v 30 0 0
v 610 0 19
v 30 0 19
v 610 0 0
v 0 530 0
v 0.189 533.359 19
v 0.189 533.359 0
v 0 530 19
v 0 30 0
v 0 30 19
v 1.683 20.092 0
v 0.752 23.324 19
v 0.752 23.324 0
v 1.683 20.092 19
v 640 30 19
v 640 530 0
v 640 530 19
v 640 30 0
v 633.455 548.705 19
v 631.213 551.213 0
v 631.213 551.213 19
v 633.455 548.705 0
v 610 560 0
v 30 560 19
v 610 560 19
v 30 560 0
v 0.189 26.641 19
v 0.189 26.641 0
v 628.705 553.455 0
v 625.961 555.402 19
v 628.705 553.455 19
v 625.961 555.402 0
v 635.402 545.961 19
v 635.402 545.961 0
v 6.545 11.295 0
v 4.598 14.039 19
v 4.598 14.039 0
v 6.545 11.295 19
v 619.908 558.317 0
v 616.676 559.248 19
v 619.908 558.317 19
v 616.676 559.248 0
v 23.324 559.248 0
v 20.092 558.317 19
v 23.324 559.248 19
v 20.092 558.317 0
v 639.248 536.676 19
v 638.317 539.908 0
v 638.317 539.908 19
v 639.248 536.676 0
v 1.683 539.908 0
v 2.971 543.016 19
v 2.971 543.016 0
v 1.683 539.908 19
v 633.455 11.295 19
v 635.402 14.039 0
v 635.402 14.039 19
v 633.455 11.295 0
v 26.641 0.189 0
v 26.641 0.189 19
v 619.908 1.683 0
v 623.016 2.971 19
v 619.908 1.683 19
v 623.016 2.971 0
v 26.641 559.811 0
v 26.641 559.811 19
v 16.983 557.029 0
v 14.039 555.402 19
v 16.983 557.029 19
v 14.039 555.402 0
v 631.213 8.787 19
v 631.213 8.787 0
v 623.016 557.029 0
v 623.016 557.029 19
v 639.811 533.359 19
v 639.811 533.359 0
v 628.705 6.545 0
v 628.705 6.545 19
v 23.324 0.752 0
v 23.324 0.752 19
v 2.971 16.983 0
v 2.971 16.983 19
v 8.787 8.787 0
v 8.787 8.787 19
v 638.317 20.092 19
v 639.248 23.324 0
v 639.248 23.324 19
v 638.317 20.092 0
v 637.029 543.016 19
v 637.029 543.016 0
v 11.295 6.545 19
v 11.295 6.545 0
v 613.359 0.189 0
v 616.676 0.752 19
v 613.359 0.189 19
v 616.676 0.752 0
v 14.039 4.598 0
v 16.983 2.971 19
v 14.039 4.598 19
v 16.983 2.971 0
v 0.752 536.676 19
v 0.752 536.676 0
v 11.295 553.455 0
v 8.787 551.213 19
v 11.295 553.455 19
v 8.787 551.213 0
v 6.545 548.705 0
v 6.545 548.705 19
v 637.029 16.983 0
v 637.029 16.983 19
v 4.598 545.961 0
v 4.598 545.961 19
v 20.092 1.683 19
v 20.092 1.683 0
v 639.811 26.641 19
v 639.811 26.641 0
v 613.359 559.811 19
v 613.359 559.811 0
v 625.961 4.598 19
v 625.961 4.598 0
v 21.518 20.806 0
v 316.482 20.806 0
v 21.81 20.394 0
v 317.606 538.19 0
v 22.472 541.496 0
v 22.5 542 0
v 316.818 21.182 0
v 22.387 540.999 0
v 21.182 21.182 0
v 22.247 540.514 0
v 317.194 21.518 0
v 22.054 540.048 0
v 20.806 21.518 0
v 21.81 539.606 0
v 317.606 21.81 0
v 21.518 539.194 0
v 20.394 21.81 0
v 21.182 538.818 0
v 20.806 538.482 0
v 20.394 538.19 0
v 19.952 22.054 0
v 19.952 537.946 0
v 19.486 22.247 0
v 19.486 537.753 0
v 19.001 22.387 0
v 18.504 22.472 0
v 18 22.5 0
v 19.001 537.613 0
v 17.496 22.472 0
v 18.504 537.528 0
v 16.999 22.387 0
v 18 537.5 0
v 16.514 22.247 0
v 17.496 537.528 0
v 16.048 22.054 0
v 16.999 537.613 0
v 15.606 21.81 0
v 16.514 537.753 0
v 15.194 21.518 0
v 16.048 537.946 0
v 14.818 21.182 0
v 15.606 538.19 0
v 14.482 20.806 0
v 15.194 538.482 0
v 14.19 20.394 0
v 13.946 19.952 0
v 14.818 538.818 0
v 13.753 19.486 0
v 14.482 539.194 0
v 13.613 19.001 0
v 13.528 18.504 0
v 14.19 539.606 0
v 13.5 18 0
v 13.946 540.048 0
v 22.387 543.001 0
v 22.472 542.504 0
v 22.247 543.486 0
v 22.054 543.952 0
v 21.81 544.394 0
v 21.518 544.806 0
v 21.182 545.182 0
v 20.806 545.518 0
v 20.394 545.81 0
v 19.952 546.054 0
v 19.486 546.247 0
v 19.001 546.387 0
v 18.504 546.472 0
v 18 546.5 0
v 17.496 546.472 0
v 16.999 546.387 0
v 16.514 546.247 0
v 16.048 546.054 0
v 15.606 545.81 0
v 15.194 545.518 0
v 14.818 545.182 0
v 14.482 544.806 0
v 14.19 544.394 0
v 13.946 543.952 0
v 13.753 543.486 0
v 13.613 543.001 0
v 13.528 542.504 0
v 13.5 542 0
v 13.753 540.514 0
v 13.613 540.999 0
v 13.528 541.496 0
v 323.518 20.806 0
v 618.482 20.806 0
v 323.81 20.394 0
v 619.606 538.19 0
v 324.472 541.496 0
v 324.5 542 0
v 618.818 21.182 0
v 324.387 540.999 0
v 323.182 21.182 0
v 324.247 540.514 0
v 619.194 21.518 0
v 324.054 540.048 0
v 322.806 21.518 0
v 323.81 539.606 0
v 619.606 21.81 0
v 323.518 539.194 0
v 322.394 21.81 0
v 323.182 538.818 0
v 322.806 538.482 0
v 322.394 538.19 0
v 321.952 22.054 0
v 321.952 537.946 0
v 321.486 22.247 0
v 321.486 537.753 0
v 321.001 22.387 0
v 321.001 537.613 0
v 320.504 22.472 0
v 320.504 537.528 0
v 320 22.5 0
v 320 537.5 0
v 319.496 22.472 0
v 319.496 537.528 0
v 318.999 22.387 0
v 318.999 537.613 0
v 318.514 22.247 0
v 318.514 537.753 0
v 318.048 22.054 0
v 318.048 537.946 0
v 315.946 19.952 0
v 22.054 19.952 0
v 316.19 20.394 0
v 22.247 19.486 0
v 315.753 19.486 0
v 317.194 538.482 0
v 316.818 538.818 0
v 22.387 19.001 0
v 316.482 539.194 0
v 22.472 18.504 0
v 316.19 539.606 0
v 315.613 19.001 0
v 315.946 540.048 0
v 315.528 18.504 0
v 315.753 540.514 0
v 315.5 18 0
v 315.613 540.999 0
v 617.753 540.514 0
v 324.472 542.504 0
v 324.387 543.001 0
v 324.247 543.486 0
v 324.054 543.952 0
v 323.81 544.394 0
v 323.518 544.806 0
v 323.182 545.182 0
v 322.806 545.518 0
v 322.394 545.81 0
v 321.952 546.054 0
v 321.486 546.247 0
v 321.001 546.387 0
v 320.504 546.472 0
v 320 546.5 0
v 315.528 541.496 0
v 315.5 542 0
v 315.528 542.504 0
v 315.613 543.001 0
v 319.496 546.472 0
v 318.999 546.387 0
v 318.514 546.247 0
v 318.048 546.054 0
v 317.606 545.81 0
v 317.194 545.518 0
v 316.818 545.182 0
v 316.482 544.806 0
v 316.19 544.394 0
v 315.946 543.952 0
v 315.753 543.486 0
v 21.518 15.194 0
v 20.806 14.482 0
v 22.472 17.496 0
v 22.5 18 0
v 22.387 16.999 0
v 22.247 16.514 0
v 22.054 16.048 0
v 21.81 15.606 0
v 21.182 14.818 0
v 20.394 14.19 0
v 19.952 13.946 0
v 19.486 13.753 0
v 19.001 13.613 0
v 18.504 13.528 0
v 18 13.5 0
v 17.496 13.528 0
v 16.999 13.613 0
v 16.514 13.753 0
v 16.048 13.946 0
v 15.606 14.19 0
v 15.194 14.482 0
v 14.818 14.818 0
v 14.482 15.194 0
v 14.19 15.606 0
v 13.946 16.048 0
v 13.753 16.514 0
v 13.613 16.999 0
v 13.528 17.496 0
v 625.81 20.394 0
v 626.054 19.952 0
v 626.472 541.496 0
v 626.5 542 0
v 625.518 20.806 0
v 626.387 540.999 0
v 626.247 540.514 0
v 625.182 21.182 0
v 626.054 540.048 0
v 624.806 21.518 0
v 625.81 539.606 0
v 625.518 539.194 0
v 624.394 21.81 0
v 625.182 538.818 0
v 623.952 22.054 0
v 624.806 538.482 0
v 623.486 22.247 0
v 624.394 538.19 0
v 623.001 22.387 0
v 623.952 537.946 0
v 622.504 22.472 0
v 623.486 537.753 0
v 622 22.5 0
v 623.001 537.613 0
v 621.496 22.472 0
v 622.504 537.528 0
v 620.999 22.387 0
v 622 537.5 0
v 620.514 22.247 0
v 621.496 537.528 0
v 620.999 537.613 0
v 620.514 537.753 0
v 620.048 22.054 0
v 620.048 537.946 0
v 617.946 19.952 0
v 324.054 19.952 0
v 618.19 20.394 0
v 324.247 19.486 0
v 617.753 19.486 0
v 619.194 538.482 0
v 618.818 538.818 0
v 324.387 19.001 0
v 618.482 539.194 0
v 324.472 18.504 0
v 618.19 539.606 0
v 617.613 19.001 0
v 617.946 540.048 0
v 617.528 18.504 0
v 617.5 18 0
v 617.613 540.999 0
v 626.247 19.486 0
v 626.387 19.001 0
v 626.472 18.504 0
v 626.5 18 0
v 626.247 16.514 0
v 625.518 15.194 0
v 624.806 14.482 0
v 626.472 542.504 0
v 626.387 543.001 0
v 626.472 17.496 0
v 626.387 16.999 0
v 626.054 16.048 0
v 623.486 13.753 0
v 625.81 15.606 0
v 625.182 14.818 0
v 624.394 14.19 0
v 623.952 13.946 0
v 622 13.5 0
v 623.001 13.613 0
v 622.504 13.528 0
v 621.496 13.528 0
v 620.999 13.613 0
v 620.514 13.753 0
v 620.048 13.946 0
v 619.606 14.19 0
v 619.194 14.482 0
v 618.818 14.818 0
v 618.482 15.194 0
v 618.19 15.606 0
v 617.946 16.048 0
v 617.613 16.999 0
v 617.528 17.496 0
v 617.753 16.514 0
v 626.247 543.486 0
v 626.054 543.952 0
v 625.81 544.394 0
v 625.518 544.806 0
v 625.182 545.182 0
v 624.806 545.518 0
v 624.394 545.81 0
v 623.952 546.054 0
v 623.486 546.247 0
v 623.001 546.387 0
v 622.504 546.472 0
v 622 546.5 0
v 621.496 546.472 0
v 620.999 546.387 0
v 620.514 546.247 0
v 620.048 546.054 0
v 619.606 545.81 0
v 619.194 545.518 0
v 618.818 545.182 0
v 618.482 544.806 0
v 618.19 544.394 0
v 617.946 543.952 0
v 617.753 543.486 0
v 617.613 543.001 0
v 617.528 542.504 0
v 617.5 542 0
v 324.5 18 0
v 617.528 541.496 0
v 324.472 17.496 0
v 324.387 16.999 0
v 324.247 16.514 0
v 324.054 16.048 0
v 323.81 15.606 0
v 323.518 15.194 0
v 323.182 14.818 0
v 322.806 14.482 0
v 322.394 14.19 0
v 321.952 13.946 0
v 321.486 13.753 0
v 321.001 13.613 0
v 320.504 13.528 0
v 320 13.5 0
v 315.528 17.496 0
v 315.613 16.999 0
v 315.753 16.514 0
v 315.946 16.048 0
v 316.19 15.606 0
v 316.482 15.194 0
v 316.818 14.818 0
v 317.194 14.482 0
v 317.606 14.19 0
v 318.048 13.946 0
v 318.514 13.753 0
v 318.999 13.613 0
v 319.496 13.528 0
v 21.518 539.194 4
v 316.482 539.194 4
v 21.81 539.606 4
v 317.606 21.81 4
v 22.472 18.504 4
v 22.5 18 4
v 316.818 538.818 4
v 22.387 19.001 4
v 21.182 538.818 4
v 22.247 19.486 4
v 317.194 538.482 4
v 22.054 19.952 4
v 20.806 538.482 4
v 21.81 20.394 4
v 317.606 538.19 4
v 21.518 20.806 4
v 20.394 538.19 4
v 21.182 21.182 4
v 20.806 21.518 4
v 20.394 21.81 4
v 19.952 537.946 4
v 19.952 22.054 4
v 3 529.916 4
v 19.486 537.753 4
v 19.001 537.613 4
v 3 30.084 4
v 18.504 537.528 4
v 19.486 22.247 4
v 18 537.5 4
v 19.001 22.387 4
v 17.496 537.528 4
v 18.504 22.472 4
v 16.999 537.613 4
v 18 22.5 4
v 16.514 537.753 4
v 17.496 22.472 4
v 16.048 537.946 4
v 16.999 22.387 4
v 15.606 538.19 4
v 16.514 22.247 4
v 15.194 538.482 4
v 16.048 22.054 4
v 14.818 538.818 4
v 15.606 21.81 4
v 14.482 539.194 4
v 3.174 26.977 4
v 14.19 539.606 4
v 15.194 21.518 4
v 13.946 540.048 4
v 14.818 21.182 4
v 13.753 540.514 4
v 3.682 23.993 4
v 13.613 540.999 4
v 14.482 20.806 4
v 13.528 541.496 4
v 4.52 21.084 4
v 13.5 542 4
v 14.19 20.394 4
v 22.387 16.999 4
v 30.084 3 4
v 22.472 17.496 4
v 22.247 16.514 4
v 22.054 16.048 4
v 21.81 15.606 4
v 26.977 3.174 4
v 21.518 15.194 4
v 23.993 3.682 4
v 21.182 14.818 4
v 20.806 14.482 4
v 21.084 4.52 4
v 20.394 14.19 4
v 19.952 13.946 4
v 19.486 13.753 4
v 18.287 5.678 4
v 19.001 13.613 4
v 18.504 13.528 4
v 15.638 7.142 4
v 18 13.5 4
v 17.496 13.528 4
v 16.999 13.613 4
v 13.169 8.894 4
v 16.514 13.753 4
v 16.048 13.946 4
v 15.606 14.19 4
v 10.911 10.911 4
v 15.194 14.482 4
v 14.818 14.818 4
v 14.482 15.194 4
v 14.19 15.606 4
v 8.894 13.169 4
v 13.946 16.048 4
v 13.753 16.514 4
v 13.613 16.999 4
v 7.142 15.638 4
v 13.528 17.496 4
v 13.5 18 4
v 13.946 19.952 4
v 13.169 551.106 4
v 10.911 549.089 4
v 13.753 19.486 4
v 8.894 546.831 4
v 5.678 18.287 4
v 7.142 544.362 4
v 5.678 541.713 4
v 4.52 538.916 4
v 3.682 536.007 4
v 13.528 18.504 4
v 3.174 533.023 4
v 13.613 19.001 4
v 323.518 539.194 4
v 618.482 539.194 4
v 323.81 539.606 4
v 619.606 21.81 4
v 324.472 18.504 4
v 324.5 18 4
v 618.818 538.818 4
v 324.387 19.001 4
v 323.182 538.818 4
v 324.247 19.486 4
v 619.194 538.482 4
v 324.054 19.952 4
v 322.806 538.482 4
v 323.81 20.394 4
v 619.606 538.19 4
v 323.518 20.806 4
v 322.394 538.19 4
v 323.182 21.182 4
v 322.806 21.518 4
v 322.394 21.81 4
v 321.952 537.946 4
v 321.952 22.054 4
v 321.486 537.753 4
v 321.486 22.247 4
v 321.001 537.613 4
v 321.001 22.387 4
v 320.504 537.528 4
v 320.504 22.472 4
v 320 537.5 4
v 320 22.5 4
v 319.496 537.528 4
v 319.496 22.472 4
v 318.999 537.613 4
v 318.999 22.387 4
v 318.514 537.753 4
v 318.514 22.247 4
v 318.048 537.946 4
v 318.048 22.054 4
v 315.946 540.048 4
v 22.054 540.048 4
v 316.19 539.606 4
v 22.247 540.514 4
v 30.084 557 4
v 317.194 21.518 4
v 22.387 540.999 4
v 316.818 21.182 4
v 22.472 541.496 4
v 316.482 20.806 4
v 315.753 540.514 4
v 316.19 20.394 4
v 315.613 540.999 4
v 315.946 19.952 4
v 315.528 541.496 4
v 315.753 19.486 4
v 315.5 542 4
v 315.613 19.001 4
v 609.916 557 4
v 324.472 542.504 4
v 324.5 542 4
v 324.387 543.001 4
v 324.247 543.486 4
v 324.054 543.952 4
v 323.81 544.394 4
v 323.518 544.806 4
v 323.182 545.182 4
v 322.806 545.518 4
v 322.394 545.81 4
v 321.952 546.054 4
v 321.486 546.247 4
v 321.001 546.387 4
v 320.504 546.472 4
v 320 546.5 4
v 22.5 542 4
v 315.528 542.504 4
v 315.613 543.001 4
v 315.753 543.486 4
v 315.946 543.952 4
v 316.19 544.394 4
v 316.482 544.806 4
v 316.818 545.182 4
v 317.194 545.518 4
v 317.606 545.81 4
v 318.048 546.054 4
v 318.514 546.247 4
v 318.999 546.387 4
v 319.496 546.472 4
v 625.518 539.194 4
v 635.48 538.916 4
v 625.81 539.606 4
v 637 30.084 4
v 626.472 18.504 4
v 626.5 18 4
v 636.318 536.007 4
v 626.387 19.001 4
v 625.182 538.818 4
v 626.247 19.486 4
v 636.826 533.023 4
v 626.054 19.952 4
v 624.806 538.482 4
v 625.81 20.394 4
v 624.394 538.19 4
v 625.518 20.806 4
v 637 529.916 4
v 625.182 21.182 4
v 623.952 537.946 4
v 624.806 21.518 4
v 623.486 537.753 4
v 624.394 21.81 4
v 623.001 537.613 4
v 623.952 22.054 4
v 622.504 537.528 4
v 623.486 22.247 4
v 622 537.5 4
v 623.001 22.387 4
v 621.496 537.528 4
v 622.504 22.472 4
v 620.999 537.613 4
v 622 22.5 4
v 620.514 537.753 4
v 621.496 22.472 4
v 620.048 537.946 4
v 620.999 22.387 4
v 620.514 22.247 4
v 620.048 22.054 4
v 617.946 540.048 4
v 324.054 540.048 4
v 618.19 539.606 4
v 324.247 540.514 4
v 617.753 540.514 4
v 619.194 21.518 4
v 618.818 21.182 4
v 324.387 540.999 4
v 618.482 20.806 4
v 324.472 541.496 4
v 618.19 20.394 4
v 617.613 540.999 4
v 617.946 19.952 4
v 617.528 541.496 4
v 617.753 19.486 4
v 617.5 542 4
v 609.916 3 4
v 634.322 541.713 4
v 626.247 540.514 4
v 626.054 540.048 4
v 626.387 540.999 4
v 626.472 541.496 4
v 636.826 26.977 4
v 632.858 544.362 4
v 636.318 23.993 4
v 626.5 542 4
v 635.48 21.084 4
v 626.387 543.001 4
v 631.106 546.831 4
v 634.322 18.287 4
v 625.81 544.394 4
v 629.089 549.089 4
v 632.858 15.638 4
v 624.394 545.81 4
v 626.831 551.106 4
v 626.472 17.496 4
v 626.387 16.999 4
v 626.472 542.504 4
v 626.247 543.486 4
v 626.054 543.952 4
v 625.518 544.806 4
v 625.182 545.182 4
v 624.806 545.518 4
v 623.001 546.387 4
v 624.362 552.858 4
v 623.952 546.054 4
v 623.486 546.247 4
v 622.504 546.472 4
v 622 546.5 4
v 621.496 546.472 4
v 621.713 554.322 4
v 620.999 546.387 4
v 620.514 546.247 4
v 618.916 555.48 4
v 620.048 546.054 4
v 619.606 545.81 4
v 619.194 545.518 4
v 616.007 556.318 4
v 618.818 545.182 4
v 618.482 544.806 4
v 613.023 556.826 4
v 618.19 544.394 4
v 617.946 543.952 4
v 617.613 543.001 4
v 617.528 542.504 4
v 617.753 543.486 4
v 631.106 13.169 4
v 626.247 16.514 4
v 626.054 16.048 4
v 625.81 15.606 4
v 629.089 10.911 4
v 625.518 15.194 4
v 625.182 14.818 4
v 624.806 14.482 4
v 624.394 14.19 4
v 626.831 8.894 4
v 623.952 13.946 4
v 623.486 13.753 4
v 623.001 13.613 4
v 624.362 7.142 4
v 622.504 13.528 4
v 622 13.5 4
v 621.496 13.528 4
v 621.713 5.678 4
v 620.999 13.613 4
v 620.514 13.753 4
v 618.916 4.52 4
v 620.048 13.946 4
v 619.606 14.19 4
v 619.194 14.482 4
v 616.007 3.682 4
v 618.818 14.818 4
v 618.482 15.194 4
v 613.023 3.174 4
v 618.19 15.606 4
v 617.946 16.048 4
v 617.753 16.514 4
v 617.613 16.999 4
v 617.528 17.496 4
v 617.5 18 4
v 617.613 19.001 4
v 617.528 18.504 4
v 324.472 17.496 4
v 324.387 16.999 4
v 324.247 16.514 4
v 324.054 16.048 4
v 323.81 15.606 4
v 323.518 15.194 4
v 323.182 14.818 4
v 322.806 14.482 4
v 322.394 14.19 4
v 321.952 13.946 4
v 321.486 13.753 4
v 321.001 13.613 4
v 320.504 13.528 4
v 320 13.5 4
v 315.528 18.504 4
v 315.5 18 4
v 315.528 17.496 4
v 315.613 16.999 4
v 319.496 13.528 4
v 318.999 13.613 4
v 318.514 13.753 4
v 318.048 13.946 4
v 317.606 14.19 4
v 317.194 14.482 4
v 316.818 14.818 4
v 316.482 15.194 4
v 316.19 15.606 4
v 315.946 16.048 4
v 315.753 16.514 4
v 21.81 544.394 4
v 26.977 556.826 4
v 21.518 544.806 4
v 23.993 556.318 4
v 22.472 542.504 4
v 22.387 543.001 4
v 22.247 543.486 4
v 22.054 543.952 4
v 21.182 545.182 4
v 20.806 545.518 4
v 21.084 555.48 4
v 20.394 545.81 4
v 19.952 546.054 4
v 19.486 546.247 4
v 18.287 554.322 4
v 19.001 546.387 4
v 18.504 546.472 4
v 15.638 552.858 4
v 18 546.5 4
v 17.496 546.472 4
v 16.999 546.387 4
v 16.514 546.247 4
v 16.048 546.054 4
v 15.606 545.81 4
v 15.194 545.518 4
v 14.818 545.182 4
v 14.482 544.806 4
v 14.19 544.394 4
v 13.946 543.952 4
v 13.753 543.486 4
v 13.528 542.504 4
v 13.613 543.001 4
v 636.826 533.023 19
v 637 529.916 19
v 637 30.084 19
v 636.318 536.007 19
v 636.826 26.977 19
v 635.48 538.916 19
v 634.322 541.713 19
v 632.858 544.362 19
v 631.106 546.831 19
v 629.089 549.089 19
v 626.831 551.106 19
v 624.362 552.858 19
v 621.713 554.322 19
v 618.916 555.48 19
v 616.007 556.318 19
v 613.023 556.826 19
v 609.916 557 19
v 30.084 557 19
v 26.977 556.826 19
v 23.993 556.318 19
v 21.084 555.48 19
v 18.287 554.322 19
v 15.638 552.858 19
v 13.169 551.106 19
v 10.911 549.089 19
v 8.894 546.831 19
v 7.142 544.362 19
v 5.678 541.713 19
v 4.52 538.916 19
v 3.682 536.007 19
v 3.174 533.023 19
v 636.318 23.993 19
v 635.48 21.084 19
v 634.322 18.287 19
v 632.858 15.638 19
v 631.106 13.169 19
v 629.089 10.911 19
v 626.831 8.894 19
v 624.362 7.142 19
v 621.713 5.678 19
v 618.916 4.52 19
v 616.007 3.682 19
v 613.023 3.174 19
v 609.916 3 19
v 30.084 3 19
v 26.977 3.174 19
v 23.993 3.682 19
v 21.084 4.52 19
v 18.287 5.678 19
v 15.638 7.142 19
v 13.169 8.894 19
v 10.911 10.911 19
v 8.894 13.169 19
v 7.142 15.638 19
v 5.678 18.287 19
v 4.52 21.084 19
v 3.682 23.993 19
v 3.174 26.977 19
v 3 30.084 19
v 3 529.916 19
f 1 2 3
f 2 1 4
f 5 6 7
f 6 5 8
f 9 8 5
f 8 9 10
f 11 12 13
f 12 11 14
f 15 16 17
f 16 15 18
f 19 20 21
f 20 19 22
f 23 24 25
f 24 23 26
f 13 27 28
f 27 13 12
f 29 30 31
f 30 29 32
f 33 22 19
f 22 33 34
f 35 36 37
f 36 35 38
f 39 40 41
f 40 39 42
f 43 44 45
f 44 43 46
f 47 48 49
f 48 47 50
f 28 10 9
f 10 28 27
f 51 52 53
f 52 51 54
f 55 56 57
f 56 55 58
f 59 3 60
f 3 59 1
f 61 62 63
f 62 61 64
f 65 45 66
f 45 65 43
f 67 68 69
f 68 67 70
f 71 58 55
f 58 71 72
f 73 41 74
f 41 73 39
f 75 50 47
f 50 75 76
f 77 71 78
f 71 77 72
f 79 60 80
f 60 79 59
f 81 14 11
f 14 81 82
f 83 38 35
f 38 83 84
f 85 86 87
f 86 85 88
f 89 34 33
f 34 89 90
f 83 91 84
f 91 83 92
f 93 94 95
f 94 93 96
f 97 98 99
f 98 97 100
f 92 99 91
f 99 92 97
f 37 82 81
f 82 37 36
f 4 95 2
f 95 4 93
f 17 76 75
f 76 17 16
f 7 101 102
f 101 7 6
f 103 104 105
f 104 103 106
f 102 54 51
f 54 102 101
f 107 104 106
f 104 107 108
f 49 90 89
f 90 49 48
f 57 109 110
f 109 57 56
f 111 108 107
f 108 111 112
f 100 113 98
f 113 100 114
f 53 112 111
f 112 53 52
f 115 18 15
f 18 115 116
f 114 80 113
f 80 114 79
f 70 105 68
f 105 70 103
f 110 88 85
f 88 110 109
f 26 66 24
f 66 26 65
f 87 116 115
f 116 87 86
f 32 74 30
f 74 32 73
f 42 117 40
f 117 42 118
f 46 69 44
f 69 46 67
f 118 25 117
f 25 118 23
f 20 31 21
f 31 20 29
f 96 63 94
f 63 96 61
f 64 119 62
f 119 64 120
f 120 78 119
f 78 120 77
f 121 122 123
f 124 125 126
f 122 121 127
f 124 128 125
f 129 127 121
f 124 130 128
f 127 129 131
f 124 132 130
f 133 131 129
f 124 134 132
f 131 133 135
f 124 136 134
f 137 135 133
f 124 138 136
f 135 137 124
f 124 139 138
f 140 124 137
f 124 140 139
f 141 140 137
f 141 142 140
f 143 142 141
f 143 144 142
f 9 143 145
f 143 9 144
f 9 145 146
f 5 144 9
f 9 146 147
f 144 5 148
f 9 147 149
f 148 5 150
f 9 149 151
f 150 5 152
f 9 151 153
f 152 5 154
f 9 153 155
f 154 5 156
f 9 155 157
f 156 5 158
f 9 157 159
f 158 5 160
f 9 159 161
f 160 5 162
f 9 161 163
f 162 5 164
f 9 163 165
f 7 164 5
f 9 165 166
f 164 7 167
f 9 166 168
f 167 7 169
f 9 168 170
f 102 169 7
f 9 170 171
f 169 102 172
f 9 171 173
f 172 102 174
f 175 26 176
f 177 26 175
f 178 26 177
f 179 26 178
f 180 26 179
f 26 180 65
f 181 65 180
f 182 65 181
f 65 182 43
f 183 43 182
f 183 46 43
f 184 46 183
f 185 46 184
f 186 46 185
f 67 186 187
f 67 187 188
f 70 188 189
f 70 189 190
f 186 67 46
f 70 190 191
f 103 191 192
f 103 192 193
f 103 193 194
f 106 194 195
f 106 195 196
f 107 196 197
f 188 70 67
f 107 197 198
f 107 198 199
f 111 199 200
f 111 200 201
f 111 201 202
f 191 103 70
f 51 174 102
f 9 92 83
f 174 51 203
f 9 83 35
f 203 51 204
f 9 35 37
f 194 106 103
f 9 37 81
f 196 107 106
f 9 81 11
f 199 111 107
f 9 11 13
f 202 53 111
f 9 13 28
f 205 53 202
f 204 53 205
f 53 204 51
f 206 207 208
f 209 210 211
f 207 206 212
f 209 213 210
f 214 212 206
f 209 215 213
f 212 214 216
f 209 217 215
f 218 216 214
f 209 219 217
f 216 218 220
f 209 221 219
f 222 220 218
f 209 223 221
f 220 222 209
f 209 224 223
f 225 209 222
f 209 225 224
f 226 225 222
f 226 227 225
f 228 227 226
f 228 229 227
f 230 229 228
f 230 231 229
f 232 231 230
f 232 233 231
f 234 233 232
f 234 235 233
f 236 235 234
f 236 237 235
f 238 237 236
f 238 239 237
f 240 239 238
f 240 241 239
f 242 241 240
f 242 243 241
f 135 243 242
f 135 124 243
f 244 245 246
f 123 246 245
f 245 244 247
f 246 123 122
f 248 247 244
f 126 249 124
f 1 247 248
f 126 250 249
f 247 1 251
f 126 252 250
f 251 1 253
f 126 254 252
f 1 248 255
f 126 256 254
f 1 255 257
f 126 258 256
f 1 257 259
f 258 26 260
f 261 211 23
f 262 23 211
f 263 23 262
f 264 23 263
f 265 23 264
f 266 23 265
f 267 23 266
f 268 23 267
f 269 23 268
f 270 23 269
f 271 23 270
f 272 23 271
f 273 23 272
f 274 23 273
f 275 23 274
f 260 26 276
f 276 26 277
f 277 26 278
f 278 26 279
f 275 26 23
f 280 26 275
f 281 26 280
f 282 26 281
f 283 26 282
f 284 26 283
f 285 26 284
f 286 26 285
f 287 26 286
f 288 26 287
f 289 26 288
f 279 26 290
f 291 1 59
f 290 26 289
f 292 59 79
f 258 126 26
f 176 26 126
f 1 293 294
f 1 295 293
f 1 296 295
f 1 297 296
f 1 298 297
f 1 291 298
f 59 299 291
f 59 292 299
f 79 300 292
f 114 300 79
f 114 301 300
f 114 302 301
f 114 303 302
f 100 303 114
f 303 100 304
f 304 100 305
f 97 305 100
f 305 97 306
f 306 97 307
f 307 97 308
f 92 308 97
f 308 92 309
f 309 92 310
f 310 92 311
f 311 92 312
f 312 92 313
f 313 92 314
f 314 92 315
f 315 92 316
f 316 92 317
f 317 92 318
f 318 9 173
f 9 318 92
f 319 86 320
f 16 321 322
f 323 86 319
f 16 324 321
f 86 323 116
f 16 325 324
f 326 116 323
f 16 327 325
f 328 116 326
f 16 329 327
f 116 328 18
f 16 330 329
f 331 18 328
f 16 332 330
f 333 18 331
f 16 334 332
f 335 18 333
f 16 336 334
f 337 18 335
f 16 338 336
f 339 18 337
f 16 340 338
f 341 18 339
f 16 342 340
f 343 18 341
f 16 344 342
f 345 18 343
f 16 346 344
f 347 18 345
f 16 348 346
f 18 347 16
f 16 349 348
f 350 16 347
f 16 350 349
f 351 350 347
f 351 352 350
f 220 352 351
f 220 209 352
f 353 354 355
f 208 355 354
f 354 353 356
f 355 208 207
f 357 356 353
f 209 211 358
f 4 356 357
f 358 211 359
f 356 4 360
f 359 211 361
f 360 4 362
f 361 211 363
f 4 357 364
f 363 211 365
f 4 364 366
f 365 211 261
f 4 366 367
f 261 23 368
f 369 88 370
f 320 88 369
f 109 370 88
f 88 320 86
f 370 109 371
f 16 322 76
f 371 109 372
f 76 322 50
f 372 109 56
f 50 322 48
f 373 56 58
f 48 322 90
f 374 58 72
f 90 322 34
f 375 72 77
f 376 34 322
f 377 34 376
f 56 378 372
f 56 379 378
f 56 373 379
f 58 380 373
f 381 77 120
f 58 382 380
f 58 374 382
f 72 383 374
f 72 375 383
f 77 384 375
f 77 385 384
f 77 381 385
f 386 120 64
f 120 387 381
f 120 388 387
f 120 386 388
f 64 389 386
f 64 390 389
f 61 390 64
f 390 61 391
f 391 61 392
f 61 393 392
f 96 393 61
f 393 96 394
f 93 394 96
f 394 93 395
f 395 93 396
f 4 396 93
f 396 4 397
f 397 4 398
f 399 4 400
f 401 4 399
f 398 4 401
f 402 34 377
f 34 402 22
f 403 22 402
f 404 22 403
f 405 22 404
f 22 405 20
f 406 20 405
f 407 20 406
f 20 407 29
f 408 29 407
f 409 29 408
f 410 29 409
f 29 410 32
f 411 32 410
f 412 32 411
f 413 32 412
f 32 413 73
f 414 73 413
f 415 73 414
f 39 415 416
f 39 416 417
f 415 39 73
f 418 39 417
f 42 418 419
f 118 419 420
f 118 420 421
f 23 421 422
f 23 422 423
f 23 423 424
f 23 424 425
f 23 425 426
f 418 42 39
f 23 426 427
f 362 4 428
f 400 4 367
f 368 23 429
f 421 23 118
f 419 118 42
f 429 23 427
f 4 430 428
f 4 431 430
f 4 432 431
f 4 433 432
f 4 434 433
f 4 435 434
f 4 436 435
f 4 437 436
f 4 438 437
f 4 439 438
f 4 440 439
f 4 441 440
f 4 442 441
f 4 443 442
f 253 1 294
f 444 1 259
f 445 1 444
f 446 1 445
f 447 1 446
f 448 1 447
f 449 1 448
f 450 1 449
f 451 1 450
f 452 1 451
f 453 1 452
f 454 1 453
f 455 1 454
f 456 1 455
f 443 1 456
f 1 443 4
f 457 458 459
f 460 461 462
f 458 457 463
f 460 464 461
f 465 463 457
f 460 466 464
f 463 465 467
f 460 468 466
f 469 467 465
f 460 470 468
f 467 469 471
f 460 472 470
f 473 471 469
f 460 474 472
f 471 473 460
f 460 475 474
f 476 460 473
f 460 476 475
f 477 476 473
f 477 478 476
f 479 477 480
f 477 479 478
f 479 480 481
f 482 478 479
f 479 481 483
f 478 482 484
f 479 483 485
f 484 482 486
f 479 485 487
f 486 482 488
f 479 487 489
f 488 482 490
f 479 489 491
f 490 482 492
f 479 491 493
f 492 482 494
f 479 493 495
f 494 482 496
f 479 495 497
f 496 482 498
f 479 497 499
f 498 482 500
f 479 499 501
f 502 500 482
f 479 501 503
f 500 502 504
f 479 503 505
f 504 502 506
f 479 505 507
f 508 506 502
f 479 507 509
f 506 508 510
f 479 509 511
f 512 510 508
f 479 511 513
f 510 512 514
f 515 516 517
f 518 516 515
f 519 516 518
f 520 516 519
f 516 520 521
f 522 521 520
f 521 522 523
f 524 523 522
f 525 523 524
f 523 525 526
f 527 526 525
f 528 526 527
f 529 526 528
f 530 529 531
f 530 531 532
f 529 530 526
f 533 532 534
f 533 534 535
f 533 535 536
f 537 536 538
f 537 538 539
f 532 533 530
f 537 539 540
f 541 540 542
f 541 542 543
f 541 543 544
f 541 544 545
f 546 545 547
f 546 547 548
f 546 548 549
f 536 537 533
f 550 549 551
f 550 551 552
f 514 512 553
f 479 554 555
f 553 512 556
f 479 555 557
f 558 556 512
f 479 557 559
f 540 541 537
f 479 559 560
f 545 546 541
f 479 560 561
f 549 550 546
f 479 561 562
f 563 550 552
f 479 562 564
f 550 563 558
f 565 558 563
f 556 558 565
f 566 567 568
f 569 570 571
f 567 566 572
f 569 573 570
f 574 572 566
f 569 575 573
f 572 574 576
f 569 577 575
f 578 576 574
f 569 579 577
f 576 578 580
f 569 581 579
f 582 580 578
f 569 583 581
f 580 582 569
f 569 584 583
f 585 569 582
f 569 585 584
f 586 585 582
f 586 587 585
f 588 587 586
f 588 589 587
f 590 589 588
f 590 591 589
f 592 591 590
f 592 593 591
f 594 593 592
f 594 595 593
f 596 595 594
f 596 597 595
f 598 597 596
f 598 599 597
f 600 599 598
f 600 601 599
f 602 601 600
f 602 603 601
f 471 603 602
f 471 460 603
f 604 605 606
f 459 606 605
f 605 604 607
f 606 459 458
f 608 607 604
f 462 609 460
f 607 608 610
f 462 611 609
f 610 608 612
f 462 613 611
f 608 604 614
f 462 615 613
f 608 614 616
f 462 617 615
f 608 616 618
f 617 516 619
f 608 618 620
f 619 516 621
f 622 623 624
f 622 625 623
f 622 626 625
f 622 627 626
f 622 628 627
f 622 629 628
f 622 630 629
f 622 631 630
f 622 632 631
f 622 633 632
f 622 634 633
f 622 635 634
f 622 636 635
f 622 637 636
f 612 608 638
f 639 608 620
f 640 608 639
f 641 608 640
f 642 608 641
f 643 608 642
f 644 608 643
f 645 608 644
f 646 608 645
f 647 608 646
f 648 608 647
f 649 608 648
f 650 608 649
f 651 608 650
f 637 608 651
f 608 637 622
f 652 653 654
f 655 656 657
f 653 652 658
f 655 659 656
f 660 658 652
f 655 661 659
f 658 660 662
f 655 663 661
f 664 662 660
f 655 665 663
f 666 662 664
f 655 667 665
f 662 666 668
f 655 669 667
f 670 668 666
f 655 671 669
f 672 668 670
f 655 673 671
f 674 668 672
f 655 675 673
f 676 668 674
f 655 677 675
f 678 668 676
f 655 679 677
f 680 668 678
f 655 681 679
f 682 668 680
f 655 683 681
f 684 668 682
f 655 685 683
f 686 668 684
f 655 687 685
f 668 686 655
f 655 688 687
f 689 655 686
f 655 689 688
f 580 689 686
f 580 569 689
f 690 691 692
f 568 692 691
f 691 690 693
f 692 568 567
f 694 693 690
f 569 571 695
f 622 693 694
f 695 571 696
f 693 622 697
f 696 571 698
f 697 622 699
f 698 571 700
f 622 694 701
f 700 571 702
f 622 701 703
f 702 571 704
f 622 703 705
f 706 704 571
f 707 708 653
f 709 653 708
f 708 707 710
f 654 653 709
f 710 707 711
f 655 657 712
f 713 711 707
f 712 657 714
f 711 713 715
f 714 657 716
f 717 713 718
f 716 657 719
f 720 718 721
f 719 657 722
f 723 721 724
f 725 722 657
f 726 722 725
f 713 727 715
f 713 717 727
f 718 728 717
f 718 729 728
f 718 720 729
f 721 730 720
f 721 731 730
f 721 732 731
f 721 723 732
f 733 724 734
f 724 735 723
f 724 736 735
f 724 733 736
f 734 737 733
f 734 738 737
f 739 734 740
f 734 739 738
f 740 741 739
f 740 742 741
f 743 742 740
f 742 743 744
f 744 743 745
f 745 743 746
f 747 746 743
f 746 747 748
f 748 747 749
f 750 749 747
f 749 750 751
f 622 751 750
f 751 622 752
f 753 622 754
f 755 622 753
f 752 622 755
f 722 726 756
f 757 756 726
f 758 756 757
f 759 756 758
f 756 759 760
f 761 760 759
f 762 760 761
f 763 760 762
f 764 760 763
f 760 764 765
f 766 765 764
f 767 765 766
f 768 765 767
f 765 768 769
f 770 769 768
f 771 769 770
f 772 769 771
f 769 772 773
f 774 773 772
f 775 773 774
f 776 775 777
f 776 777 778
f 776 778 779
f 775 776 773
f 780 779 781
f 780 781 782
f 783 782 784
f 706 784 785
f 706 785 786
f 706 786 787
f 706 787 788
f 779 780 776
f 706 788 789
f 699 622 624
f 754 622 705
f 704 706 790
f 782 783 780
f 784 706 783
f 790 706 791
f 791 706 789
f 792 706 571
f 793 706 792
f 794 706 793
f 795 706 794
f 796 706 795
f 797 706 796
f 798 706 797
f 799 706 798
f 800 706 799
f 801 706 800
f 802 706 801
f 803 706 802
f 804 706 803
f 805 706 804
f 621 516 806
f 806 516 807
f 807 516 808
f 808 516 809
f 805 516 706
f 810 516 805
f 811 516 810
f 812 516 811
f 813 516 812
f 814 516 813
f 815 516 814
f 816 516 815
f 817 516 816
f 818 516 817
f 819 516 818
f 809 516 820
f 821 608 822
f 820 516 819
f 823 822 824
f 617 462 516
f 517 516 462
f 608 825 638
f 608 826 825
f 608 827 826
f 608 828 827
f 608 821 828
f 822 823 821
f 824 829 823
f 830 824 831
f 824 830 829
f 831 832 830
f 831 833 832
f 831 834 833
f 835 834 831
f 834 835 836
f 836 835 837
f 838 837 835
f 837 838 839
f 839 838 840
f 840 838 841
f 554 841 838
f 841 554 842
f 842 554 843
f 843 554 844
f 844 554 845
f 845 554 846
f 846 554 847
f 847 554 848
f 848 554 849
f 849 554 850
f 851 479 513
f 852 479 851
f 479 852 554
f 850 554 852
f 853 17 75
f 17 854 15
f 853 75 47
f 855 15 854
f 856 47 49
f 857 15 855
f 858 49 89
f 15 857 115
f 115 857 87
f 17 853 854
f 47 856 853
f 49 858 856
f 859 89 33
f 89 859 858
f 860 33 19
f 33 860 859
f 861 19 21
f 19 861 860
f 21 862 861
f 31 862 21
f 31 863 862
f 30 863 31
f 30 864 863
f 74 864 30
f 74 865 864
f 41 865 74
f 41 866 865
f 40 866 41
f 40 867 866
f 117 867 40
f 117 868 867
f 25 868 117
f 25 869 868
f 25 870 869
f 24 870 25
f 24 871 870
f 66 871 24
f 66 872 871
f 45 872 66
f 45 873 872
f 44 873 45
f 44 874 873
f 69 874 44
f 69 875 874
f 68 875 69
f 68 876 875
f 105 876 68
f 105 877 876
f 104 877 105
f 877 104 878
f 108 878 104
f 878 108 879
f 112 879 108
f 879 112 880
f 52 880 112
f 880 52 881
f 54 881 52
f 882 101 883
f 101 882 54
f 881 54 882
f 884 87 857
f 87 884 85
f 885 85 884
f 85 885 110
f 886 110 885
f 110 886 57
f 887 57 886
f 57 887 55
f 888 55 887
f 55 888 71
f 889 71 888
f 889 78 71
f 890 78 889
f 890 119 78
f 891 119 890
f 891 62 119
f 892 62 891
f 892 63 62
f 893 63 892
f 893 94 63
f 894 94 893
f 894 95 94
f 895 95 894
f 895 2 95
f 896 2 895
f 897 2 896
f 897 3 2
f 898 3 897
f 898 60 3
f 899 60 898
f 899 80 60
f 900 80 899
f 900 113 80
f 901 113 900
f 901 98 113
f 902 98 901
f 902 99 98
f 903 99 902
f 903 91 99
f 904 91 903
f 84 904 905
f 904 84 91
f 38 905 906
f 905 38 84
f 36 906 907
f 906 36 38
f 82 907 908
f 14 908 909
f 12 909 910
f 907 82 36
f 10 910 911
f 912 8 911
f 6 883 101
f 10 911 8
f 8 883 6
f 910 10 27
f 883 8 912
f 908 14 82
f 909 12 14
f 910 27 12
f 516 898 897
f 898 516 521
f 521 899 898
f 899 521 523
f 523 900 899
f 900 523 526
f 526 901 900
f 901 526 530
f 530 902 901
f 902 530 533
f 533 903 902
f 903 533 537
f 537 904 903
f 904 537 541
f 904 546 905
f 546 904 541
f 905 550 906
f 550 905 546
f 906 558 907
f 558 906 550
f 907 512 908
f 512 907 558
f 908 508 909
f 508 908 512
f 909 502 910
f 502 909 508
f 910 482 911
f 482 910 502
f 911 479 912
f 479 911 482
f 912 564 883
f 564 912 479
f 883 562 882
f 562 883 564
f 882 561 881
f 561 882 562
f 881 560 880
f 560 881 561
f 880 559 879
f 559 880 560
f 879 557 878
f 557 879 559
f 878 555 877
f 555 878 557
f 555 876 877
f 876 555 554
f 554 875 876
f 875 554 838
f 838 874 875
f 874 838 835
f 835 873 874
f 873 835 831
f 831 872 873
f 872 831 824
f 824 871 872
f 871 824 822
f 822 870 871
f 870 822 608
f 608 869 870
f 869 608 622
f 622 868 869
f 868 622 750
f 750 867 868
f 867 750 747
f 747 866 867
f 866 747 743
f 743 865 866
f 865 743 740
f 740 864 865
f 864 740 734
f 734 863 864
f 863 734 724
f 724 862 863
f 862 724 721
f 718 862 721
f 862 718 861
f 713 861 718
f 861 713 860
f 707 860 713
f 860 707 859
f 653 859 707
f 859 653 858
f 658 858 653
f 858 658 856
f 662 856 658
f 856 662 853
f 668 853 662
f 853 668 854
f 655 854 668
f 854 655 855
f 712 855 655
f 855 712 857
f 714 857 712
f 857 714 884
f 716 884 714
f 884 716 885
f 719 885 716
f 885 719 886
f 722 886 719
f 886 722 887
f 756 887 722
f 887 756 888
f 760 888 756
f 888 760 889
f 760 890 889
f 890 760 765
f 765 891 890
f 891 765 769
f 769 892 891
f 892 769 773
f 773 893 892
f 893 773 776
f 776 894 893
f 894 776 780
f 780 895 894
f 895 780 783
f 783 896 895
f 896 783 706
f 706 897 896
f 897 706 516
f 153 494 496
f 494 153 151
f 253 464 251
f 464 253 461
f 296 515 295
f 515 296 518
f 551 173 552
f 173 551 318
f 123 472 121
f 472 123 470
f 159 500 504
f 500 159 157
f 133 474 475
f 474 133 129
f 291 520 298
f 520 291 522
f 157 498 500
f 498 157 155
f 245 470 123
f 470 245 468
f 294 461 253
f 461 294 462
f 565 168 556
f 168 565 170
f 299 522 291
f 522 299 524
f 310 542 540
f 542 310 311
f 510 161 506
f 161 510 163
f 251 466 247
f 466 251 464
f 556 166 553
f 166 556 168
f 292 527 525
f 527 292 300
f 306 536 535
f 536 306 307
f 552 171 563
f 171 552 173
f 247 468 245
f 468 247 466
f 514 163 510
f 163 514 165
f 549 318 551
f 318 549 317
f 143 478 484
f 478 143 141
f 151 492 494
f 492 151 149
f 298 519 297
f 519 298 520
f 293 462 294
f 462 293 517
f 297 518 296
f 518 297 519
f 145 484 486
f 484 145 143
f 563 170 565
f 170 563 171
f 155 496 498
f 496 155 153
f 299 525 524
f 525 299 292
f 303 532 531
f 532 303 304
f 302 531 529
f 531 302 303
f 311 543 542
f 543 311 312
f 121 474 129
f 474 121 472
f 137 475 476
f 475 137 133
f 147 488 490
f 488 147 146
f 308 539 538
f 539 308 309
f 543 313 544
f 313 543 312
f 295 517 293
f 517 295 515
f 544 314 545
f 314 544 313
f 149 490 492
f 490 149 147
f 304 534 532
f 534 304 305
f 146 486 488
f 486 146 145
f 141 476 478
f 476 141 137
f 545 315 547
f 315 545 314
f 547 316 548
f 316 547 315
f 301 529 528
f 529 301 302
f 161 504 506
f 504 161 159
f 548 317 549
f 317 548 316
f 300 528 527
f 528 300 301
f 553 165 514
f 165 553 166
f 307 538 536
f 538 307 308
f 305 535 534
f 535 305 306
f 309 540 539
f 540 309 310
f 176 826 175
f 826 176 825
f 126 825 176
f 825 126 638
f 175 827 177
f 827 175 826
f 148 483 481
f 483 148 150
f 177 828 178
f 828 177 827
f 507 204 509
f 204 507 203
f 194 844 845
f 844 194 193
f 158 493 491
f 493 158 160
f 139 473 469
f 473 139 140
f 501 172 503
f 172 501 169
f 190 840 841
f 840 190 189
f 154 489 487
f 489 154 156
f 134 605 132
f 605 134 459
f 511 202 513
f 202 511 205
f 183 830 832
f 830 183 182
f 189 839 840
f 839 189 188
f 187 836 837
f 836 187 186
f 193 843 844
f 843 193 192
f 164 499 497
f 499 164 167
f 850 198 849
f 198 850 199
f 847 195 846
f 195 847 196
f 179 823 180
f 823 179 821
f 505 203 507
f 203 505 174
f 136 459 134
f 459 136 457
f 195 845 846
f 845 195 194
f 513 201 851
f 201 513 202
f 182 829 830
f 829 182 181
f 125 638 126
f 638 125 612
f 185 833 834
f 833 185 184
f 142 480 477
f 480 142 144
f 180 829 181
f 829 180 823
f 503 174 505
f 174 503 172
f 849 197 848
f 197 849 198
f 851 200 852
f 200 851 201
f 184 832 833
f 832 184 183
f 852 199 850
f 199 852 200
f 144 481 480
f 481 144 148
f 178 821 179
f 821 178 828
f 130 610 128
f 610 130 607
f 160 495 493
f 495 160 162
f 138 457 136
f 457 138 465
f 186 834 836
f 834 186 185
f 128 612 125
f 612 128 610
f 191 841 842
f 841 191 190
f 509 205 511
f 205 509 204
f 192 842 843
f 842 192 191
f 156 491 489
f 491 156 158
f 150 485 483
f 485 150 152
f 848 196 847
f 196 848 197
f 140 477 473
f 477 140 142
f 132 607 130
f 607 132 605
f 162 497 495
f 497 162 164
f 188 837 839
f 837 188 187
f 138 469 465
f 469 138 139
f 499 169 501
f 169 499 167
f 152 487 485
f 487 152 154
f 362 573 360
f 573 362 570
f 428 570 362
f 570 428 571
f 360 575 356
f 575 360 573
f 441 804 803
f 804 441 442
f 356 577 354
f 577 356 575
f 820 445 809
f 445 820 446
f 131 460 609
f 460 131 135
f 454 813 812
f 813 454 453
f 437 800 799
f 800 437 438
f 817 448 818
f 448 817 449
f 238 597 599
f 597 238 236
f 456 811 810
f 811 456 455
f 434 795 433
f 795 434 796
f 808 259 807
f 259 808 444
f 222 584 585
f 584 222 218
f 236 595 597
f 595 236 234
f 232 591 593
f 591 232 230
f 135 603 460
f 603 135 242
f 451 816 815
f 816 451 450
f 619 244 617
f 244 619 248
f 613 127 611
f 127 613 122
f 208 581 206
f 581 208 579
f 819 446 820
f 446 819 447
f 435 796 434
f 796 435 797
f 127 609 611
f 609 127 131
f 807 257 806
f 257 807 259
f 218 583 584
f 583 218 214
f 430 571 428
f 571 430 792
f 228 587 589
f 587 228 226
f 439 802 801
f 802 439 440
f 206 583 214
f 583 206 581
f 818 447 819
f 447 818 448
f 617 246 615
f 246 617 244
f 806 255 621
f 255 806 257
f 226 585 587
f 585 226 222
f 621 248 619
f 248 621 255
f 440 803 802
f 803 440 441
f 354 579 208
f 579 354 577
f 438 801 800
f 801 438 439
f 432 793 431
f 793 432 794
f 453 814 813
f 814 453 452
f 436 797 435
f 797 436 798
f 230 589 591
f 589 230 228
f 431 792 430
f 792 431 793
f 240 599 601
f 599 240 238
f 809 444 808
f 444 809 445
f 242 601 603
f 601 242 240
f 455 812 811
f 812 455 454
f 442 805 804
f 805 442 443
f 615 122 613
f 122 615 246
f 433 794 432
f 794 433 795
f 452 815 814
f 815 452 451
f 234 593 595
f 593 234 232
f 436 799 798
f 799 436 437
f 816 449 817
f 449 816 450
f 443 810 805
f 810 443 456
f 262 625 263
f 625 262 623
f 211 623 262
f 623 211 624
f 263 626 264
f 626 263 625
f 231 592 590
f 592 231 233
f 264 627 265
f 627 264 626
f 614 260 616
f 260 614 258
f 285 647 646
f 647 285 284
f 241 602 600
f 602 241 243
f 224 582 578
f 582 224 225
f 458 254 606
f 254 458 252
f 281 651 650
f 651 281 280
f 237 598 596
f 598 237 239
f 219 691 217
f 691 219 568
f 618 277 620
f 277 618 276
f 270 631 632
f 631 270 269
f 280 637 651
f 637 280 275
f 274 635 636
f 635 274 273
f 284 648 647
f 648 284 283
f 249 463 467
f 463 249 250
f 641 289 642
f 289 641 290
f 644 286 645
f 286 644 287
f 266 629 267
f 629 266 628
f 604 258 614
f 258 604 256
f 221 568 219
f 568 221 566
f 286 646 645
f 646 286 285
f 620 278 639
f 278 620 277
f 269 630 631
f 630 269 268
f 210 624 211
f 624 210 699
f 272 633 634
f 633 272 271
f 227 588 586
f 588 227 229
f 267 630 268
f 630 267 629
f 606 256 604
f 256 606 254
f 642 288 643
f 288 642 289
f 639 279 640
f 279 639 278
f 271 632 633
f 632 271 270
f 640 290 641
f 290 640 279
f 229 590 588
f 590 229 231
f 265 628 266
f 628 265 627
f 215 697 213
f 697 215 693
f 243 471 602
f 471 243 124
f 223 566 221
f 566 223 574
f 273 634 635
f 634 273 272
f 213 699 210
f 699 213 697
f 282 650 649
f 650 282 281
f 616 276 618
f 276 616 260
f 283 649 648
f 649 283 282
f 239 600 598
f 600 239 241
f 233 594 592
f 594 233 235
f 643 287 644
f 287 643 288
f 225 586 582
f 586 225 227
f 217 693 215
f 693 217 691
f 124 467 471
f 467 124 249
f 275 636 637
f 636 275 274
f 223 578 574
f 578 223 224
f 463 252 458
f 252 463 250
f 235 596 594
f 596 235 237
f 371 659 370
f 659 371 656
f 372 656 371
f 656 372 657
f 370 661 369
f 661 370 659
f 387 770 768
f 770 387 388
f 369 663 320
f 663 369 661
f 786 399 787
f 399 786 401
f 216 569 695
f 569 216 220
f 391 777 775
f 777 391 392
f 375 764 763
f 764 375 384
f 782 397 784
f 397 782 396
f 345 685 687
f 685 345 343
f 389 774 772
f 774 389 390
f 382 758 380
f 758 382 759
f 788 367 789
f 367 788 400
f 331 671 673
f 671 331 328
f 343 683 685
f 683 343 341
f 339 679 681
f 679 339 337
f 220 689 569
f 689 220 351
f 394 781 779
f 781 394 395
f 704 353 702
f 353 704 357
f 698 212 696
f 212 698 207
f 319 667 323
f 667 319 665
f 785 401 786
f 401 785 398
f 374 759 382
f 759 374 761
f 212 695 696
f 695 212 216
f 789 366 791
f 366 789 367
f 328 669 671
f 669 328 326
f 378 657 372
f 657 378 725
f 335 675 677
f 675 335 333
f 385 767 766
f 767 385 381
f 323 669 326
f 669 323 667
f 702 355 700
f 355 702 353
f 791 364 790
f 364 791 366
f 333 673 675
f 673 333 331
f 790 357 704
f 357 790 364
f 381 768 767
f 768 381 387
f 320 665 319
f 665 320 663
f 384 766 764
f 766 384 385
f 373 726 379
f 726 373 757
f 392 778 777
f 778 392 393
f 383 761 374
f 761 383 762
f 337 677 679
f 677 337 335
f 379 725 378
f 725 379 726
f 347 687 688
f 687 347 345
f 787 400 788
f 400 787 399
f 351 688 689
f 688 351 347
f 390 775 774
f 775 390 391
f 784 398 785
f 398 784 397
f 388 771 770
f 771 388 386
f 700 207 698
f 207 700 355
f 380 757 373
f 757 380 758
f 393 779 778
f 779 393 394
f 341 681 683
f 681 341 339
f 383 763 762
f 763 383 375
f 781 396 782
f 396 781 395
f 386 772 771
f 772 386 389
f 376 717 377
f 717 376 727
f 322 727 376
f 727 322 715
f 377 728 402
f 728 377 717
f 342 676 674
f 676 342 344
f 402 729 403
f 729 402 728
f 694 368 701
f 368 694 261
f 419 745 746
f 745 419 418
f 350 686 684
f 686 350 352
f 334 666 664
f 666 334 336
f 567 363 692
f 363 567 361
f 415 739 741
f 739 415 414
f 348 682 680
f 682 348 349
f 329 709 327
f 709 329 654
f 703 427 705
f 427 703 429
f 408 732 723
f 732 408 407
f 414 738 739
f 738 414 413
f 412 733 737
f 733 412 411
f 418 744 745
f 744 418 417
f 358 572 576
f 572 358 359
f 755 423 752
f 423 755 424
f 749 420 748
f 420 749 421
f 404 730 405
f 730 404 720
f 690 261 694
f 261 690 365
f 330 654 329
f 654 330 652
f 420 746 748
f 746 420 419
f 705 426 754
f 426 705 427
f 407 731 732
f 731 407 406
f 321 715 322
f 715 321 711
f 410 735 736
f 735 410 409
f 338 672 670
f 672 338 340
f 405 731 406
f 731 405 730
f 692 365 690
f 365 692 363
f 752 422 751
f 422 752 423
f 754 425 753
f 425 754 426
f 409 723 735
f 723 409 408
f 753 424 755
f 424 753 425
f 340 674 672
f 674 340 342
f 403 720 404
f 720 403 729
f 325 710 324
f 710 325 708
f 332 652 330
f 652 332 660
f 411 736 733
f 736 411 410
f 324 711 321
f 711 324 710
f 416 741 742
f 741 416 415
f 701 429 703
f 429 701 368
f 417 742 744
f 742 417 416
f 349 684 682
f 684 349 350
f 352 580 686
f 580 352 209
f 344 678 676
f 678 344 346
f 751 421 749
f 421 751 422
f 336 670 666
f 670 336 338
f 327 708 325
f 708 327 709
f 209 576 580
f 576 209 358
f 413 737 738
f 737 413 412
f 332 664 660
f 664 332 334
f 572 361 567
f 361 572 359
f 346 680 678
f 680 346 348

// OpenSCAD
// 944 EV — SKID PLATE (parametric, flat with turned-up lip)
// Protects the low main battery box from road strikes (the box sits low, ADR-0005/0011).
// Sacrificial + replaceable. All dims mm -- size to the MAIN box footprint + margin.
// Steel preferred under the pack (strike resistance). Preview: cad/skid-plate.svg. Gate G4.

plate_L  = 640;   // box footprint length + margin (MEASURE main box / bay)
plate_W  = 560;   // box footprint width  + margin
plate_t  = 4;     // 3-5 mm steel
corner_r = 30;
bolt_d   = 9;
inset    = 18;    // bolt inset from edge
n_long   = 3;     // bolts along each long edge
n_wide   = 2;     // bolts along each short edge
lip_h    = 15;    // turned-up edge lip (deflects strikes)
lip_t    = 3;

$fn = 56;

module rr(w, h, r) { hull() for (x = [r, w-r], y = [r, h-r]) translate([x, y]) circle(r); }

difference() {
  union() {
    linear_extrude(plate_t) rr(plate_L, plate_W, corner_r);
    // perimeter lip wall
    linear_extrude(plate_t + lip_h)
      difference() { rr(plate_L, plate_W, corner_r); offset(-lip_t) rr(plate_L, plate_W, corner_r); }
  }
  // long-edge bolts
  for (i = [0 : n_long-1], y = [inset, plate_W - inset])
    translate([inset + i*(plate_L - 2*inset)/(n_long-1), y, -1])
      cylinder(d = bolt_d, h = plate_t + 2);
  // short-edge bolts
  for (j = [0 : n_wide-1], x = [inset, plate_L - inset])
    translate([x, inset + j*(plate_W - 2*inset)/(n_wide-1), -1])
      cylinder(d = bolt_d, h = plate_t + 2);
}
// Export DXF (flat) for laser/waterjet + brake the lip; print skid-plate.svg 1:1 to template.
